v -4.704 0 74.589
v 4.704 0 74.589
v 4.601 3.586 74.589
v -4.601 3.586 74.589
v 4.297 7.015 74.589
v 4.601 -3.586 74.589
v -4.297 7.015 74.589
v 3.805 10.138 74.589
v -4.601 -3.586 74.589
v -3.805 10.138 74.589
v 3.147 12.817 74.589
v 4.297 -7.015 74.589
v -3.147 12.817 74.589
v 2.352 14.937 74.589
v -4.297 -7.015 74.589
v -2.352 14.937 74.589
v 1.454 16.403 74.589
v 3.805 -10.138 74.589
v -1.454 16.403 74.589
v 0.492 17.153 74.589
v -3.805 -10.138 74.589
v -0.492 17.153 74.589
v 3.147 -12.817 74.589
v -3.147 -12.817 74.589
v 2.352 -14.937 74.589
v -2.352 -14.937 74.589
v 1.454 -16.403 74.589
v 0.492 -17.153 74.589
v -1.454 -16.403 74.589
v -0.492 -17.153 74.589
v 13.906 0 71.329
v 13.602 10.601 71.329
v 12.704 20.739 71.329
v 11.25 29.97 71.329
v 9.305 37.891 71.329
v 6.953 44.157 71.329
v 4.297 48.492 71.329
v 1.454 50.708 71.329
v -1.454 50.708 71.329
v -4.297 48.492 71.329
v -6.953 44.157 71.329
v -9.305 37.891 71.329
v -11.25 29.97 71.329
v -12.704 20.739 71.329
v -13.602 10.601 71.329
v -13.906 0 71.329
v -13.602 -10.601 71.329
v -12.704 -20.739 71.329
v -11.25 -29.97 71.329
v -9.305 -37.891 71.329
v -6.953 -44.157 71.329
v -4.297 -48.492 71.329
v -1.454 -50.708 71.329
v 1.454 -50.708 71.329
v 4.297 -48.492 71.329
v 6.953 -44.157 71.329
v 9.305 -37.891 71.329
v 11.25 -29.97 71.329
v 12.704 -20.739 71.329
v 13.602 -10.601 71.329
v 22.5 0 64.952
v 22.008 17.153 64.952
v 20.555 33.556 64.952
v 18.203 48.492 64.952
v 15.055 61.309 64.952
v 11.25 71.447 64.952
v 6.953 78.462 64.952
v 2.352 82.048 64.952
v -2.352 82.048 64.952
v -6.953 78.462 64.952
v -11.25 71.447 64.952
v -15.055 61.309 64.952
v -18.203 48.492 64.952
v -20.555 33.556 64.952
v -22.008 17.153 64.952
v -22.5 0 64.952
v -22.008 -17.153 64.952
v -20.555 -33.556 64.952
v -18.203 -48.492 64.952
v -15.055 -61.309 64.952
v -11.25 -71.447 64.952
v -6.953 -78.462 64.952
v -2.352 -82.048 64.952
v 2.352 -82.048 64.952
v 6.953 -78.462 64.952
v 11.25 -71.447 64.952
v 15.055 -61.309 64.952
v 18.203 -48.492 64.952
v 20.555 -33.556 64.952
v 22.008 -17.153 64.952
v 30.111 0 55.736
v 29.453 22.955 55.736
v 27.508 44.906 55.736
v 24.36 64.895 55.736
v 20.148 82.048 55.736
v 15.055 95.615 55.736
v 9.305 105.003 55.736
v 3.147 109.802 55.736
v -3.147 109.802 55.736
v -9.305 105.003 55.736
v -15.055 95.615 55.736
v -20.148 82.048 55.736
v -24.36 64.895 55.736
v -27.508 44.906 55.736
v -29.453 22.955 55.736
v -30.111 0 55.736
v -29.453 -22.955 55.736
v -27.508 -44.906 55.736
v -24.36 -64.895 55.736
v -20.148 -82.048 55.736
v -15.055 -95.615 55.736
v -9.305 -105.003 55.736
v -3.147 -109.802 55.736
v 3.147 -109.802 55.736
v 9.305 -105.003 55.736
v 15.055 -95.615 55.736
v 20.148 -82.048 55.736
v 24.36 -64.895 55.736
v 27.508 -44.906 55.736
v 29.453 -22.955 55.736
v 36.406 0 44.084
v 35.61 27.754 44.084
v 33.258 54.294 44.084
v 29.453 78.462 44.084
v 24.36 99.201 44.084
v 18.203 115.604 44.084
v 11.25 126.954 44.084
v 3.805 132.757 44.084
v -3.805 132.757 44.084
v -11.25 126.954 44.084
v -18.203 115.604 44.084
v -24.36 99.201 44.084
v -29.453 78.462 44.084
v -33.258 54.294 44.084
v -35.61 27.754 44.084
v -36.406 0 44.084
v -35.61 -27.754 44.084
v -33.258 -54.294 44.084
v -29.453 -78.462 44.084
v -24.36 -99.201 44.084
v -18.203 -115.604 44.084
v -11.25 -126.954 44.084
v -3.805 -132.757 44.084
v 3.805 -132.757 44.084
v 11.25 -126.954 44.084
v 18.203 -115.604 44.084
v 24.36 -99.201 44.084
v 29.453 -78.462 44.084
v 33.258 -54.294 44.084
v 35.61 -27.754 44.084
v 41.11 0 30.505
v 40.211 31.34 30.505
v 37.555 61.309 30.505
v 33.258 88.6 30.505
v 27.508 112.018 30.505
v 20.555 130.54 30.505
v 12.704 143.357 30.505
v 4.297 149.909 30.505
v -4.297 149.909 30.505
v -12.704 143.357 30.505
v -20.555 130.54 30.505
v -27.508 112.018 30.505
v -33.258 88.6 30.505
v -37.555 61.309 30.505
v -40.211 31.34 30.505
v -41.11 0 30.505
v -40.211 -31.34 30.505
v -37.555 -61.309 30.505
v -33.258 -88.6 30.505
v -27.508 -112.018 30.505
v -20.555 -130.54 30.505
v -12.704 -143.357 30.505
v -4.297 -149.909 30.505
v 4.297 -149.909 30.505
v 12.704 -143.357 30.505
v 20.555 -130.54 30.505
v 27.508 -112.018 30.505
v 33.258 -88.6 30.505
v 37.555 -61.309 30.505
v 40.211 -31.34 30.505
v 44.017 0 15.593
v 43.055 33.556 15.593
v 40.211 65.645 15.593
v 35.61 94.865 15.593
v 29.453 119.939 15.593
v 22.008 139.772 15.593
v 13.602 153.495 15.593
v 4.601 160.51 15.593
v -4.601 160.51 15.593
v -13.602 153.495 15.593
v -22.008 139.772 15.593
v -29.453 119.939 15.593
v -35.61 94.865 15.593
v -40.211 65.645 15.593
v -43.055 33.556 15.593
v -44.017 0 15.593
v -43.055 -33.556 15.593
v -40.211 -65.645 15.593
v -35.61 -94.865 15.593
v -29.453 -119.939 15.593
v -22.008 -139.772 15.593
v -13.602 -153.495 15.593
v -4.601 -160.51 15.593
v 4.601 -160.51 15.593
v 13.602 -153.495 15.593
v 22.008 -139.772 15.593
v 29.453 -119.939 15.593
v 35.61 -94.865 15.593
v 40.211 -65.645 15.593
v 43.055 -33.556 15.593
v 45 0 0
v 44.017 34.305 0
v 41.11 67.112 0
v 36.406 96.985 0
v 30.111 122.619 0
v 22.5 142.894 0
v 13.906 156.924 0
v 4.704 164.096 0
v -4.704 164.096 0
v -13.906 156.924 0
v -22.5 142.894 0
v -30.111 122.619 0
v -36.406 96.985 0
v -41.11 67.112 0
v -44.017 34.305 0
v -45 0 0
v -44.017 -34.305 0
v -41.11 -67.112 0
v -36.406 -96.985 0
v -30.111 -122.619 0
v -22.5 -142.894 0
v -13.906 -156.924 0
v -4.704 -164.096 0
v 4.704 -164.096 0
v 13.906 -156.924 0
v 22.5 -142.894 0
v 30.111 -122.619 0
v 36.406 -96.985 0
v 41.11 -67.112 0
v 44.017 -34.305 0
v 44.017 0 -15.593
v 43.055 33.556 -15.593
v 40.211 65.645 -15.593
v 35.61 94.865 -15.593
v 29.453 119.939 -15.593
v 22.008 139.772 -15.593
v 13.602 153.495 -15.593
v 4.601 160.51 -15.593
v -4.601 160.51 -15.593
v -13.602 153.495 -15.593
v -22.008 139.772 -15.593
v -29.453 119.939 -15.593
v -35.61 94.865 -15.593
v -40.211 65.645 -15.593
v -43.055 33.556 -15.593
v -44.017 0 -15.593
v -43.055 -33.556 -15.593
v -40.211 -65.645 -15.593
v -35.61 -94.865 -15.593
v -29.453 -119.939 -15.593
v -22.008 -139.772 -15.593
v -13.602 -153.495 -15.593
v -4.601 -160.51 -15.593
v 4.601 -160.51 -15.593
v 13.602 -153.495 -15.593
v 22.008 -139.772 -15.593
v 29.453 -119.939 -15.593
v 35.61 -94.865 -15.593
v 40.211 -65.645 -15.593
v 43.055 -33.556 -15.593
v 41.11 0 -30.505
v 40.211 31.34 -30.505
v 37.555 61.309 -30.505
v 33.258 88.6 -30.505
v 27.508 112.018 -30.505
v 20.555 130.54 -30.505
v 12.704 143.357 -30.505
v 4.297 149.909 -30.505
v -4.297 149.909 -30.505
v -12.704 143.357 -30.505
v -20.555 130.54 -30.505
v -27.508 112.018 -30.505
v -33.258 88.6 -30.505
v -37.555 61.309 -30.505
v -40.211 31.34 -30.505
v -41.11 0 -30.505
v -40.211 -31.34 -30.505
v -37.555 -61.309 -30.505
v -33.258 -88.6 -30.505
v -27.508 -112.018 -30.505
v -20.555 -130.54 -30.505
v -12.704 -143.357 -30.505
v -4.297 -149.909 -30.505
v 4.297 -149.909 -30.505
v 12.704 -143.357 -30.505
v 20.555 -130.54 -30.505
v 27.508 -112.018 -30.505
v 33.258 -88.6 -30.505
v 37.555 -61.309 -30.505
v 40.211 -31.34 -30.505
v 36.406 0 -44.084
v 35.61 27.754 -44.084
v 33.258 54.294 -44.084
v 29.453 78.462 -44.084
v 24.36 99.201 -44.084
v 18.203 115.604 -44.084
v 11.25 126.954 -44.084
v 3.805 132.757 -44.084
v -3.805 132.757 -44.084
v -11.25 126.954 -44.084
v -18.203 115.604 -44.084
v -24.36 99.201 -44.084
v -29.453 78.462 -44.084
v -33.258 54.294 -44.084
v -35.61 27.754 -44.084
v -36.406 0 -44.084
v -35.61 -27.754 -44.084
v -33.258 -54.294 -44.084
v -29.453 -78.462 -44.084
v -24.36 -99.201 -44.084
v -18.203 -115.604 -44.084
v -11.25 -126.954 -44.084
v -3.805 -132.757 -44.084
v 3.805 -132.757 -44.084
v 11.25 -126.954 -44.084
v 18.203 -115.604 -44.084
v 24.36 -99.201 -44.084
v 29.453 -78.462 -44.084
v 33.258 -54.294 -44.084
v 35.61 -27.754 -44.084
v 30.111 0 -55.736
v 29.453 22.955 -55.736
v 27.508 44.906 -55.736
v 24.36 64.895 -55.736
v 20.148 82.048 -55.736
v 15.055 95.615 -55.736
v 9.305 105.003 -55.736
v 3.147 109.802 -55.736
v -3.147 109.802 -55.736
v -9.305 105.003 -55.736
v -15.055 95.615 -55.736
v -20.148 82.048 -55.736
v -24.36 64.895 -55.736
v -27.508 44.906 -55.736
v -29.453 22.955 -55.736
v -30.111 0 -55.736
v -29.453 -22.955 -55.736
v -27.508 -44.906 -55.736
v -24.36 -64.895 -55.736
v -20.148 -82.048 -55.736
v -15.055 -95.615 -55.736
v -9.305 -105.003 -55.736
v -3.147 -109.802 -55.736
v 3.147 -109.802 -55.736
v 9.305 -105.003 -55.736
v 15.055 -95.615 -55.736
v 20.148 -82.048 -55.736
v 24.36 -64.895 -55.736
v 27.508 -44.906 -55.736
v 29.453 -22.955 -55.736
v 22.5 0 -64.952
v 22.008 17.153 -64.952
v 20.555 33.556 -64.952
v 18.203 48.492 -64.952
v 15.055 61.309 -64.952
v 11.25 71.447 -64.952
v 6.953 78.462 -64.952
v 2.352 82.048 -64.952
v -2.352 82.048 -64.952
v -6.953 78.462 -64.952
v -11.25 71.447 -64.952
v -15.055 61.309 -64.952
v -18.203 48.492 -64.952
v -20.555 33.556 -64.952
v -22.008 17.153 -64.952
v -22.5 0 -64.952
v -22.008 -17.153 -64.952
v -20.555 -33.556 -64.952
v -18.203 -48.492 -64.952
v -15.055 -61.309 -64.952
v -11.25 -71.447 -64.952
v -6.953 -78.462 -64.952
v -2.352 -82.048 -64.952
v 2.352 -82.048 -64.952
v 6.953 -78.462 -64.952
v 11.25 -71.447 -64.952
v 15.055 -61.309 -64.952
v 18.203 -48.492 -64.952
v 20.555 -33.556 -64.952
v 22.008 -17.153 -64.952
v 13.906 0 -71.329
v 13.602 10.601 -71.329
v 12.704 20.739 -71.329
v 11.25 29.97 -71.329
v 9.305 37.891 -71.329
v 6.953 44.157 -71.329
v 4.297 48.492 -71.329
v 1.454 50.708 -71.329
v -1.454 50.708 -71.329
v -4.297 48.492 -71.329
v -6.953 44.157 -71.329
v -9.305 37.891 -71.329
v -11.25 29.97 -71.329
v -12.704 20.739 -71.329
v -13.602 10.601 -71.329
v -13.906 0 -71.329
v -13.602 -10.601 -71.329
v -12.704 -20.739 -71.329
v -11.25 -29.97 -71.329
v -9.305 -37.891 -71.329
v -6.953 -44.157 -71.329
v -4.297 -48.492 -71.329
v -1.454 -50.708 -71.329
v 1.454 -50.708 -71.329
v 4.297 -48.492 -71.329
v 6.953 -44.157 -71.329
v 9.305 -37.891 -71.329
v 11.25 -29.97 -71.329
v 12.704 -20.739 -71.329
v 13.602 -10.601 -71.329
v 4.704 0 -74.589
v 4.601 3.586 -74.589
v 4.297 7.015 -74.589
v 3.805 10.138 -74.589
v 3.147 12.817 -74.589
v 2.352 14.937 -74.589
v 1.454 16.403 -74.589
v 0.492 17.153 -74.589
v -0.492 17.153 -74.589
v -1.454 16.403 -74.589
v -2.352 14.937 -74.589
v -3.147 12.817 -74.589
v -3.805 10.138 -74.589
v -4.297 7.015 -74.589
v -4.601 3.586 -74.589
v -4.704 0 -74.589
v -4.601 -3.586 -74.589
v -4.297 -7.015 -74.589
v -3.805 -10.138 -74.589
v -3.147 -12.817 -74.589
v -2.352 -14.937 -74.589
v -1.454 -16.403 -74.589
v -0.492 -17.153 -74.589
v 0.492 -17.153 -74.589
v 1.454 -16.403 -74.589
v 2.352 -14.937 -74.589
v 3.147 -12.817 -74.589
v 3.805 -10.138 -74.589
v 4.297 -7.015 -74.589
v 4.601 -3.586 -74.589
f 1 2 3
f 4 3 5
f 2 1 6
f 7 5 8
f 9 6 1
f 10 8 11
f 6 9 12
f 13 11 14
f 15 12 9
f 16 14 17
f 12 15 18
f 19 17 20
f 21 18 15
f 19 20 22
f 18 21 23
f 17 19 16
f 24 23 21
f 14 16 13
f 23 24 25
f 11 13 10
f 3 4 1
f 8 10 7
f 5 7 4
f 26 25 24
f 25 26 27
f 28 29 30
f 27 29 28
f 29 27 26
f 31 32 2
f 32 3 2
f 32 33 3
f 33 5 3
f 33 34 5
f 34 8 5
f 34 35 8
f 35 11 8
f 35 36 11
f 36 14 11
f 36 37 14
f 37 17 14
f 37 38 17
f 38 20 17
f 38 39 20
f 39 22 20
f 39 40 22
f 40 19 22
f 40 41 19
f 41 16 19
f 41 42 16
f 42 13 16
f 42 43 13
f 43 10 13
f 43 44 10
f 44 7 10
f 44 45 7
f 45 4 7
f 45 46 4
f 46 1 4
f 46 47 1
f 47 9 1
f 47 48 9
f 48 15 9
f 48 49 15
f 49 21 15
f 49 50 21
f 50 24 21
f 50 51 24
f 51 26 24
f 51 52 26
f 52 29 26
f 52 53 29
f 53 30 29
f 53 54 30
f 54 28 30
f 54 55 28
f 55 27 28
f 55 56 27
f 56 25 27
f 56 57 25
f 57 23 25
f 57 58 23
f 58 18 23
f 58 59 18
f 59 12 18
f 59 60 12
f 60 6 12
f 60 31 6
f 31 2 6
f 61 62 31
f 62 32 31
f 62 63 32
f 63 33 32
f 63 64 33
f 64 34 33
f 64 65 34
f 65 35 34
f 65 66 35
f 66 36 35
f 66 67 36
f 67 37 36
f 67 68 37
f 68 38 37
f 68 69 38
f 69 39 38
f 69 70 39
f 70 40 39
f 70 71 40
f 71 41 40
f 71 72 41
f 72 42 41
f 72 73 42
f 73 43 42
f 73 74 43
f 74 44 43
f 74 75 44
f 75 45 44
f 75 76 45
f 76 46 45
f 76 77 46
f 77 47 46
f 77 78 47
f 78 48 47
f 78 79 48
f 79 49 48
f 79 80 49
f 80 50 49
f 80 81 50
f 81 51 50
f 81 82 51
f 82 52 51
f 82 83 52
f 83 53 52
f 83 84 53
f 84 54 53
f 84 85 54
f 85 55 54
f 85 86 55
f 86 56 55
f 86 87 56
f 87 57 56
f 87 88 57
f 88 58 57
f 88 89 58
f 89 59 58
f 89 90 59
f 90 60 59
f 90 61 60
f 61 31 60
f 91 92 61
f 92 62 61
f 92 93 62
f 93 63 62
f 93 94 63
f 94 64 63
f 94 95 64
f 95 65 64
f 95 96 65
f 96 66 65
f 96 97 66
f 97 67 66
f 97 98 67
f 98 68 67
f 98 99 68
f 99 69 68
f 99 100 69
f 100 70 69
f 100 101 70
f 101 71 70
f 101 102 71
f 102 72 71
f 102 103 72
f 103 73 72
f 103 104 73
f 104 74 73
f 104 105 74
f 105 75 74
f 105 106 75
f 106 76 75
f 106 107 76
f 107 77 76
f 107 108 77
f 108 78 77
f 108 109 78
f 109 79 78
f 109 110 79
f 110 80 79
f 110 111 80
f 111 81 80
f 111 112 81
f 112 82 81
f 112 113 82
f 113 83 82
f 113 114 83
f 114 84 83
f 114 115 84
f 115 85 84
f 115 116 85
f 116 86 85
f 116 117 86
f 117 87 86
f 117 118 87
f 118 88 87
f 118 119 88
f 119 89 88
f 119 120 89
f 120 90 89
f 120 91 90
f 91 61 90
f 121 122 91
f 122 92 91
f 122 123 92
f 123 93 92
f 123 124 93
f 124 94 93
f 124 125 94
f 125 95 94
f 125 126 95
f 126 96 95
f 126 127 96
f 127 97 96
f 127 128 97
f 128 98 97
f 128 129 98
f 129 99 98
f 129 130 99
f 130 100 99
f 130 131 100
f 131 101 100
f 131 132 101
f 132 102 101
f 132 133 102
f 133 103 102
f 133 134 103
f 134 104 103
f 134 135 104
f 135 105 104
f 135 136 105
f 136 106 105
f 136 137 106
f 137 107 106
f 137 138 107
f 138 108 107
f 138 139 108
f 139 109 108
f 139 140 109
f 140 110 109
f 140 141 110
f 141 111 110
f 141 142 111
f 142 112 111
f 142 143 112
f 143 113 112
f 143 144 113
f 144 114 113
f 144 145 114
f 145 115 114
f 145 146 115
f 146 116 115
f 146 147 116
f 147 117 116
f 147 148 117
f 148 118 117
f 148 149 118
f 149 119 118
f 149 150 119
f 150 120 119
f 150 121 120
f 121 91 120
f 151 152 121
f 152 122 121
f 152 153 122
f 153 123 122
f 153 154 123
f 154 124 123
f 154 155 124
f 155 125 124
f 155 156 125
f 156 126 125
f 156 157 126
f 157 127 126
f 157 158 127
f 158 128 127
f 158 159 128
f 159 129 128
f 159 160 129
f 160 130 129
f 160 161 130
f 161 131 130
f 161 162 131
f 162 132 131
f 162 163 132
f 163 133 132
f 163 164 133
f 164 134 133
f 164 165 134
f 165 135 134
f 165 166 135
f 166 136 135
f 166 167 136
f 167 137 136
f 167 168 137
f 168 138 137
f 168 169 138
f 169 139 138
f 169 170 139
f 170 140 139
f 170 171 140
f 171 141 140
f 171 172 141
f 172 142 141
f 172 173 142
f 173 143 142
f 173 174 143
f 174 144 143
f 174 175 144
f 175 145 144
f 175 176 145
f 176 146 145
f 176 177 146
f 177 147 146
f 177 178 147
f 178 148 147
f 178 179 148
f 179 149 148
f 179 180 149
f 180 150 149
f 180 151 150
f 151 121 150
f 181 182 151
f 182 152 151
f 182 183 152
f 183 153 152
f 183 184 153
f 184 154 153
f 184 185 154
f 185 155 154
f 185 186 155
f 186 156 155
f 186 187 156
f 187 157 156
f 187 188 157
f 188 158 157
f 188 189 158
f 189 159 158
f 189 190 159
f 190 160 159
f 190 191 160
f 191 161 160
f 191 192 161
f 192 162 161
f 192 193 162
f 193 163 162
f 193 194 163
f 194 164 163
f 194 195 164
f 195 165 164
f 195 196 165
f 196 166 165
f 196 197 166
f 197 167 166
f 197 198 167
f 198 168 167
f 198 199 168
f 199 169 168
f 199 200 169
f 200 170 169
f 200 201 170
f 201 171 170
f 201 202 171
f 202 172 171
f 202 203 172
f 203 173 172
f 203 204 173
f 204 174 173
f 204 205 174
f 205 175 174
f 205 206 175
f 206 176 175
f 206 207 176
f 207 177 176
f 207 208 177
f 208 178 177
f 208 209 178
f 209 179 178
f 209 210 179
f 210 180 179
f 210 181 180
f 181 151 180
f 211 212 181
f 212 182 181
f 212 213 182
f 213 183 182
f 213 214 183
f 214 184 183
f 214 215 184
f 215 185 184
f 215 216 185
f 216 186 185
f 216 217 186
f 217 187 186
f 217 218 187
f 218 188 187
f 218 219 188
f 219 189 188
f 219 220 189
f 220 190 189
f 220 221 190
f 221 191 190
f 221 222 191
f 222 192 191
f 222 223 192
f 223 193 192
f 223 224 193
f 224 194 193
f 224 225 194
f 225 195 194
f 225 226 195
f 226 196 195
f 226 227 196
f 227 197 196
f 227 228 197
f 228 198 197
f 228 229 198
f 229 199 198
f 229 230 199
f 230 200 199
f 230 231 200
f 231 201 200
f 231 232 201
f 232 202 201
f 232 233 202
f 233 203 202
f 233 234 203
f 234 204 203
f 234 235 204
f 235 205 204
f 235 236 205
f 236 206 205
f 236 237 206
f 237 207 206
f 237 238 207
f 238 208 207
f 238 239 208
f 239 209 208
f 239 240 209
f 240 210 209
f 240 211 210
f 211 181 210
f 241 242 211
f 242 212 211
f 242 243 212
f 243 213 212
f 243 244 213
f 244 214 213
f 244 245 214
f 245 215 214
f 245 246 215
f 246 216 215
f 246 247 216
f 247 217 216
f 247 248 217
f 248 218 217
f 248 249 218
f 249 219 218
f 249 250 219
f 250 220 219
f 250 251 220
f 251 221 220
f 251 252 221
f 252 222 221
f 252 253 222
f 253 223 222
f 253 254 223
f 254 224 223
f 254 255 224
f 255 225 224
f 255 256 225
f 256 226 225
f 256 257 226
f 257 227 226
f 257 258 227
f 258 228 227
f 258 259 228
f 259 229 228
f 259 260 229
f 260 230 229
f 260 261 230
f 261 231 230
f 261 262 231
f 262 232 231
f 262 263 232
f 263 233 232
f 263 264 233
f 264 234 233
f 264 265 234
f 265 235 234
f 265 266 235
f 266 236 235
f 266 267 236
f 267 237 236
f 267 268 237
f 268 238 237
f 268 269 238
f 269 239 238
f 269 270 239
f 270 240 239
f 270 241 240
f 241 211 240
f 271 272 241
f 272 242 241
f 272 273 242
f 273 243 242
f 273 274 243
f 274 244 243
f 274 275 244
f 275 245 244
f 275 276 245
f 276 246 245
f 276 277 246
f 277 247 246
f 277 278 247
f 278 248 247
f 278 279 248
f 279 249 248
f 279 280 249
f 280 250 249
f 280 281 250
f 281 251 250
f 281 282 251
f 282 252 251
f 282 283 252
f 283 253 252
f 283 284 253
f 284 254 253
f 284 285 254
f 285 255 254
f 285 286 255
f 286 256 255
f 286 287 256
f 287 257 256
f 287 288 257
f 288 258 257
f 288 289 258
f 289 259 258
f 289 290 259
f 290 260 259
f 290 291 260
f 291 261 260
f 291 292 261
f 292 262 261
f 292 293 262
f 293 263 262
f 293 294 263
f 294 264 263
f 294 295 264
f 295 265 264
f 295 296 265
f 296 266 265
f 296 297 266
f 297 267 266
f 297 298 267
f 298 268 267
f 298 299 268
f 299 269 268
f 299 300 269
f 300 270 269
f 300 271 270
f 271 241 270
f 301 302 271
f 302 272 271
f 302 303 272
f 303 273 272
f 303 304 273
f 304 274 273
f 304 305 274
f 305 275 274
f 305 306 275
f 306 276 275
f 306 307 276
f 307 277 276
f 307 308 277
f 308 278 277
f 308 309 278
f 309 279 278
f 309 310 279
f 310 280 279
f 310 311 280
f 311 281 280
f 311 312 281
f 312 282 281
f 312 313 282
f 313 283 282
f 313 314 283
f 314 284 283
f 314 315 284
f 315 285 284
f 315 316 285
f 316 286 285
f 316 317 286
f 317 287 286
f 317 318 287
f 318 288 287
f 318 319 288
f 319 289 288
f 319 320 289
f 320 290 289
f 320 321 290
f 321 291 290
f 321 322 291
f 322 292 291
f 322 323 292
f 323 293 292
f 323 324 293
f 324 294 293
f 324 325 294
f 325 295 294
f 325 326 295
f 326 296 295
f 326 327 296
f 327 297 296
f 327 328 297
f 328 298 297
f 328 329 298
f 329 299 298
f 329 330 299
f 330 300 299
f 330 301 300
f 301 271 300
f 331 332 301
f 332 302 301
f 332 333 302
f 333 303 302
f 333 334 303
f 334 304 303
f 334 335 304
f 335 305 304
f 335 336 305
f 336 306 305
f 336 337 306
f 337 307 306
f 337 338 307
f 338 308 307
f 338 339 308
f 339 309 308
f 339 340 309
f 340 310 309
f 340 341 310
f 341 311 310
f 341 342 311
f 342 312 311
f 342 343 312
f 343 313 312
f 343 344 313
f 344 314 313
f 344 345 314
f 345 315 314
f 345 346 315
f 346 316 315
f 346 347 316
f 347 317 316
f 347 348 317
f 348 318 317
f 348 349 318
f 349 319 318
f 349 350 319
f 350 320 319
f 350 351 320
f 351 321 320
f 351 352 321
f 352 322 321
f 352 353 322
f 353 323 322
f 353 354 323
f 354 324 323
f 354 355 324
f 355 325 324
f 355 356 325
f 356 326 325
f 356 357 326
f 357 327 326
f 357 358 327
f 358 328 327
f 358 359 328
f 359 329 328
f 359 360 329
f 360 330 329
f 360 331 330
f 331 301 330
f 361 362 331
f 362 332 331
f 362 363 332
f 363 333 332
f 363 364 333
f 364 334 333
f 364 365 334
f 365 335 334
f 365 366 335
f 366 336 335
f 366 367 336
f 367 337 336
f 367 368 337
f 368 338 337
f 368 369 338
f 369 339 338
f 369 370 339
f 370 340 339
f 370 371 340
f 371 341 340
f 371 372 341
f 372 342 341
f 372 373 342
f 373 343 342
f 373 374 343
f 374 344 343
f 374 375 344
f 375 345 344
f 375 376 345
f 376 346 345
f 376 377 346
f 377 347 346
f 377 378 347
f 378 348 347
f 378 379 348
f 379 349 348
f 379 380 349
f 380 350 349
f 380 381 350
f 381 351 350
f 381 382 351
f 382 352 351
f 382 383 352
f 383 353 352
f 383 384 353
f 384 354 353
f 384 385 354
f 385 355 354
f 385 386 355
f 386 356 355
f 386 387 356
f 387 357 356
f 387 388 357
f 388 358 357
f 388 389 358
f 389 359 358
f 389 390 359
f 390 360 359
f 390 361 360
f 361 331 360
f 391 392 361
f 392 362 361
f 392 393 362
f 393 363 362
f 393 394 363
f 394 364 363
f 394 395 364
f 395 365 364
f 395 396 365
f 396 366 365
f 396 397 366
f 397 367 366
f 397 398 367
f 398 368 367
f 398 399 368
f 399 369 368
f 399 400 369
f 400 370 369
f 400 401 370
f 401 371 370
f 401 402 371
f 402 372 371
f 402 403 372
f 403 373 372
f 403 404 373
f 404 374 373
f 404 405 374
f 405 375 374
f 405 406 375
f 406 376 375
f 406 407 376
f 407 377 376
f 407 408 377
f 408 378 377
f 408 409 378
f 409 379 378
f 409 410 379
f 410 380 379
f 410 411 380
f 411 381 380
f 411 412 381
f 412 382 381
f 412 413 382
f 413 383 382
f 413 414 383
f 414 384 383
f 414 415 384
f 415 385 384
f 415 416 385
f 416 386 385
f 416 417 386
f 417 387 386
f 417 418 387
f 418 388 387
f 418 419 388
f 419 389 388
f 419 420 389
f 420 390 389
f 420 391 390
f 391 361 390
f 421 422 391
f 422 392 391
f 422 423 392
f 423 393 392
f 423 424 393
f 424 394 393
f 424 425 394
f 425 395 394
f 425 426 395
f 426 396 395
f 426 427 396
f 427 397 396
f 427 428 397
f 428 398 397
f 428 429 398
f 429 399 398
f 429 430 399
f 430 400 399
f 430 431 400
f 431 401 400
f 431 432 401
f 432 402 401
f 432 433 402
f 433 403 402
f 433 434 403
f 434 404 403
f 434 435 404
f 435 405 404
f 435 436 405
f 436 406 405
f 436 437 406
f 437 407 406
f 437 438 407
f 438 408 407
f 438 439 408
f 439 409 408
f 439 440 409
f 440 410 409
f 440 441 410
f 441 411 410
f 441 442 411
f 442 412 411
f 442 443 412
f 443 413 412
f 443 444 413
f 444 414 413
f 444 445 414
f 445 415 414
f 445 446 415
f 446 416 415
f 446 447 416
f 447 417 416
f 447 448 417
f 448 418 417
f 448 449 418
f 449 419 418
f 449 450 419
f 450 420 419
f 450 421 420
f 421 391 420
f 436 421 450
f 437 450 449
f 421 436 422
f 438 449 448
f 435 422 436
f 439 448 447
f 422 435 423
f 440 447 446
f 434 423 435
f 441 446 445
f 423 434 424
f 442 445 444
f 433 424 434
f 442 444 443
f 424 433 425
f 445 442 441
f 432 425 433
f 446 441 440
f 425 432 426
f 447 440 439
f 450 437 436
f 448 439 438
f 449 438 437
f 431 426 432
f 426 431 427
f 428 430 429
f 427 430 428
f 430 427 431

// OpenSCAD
// Generated by SolidPython 1.0.1 on 2020-07-29 00:46:45


scale(v = [3, 11, 5]) {
	sphere(r = 15);
}
/***********************************************
*********      SolidPython code:      **********
************************************************
 
# import packages: SolidPython
from solid import *
from solid.utils import *
from itertools import chain, combinations, permutations


class Resize:

    def __init__(self, scad_file):
        self.scad_file = scad_file
        #self.scad_file = import_scad(scad_file)
        # cone/cylinder param:
        self.r1 = 0
        self.r2 = 0
        self.h = 0
        # rectangular prism param:
        self.w = 0
        self.l = 0
        # ellipse param:
        self.r = 0

    # import OpenScad code (file name corresponds to shape)


    # classify shape + parameters
    def assign(self, param1, param2, param3):
        if self.scad_file == 'cone.scad':
            self.r1 = param1
            self.r2 = param2
            self.h = param3
        elif self.scad_file == 'cylinder.scad':
            self.r1 = param1
            self.r2 = param2
            self.h = param3
        elif self.scad_file == 'rectangularPrism.scad':
            self.h = param1
            self.l = param2
            self.w = param3
        else:
            self.r = param1
            self.h = param2

    # resize parameters
    def iterate(self):
        x = range(3, 20, 2)
        i = 1
        if self.scad_file == 'cone.scad':
            tempList = list(permutations(x, 2))
            for temp in tempList:
                param1 = temp[0]
                param2 = temp[1]
                filepath = 'produced_scad_files/' + 'cone' + str(param1) + '_' + str(param2) + '_' + '.scad'
                scad_render_to_file(cylinder(h=param1, r1=param2, r2=0), filepath)

        elif self.scad_file == 'cylinder.scad':
            tempList = list(permutations(x, 3))
            for temp in tempList:
                param1 = temp[0]
                param2 = temp[1]
                filepath = 'produced_scad_files/' + 'cylinder' + str(param1) + '_' + str(param2) + '_' + '.scad'
                scad_render_to_file(cylinder(h=param1, r1=param2, r2=param2), filepath)

        elif self.scad_file == 'rectangularPrism.scad':
            tempList = list(permutations(x, 3))
            for temp in tempList:
                param1 = temp[0]
                param2 = temp[1]
                param3 = temp[2]
                filepath = 'produced_scad_files/' + 'rectangularPrism' + str(param1) + '_' + str(param2) + '_' + str(
                    param3) + '.scad'
                scad_render_to_file(cube(size=(param1, param2, param3)), filepath)

        elif self.scad_file == 'ellipse.scad':
            tempList = list(permutations(x, 4))
            for temp in tempList:
                param1 = temp[0]
                param2 = temp[1]
                param3 = temp[2]
                param4 = temp[3]
                filepath = 'produced_scad_files/' + 'ellipse' + str(param1) + '_' + str(param2) + '_' + str(param3) + '_' + str(param4) + '.scad'
                scad_render_to_file(scale([param1, param2, param3])(sphere(r=param4)), filepath)

    def render_to_scadfile(self):
        scad_render_to_file(scad, 'example.scad') 
 
************************************************/
